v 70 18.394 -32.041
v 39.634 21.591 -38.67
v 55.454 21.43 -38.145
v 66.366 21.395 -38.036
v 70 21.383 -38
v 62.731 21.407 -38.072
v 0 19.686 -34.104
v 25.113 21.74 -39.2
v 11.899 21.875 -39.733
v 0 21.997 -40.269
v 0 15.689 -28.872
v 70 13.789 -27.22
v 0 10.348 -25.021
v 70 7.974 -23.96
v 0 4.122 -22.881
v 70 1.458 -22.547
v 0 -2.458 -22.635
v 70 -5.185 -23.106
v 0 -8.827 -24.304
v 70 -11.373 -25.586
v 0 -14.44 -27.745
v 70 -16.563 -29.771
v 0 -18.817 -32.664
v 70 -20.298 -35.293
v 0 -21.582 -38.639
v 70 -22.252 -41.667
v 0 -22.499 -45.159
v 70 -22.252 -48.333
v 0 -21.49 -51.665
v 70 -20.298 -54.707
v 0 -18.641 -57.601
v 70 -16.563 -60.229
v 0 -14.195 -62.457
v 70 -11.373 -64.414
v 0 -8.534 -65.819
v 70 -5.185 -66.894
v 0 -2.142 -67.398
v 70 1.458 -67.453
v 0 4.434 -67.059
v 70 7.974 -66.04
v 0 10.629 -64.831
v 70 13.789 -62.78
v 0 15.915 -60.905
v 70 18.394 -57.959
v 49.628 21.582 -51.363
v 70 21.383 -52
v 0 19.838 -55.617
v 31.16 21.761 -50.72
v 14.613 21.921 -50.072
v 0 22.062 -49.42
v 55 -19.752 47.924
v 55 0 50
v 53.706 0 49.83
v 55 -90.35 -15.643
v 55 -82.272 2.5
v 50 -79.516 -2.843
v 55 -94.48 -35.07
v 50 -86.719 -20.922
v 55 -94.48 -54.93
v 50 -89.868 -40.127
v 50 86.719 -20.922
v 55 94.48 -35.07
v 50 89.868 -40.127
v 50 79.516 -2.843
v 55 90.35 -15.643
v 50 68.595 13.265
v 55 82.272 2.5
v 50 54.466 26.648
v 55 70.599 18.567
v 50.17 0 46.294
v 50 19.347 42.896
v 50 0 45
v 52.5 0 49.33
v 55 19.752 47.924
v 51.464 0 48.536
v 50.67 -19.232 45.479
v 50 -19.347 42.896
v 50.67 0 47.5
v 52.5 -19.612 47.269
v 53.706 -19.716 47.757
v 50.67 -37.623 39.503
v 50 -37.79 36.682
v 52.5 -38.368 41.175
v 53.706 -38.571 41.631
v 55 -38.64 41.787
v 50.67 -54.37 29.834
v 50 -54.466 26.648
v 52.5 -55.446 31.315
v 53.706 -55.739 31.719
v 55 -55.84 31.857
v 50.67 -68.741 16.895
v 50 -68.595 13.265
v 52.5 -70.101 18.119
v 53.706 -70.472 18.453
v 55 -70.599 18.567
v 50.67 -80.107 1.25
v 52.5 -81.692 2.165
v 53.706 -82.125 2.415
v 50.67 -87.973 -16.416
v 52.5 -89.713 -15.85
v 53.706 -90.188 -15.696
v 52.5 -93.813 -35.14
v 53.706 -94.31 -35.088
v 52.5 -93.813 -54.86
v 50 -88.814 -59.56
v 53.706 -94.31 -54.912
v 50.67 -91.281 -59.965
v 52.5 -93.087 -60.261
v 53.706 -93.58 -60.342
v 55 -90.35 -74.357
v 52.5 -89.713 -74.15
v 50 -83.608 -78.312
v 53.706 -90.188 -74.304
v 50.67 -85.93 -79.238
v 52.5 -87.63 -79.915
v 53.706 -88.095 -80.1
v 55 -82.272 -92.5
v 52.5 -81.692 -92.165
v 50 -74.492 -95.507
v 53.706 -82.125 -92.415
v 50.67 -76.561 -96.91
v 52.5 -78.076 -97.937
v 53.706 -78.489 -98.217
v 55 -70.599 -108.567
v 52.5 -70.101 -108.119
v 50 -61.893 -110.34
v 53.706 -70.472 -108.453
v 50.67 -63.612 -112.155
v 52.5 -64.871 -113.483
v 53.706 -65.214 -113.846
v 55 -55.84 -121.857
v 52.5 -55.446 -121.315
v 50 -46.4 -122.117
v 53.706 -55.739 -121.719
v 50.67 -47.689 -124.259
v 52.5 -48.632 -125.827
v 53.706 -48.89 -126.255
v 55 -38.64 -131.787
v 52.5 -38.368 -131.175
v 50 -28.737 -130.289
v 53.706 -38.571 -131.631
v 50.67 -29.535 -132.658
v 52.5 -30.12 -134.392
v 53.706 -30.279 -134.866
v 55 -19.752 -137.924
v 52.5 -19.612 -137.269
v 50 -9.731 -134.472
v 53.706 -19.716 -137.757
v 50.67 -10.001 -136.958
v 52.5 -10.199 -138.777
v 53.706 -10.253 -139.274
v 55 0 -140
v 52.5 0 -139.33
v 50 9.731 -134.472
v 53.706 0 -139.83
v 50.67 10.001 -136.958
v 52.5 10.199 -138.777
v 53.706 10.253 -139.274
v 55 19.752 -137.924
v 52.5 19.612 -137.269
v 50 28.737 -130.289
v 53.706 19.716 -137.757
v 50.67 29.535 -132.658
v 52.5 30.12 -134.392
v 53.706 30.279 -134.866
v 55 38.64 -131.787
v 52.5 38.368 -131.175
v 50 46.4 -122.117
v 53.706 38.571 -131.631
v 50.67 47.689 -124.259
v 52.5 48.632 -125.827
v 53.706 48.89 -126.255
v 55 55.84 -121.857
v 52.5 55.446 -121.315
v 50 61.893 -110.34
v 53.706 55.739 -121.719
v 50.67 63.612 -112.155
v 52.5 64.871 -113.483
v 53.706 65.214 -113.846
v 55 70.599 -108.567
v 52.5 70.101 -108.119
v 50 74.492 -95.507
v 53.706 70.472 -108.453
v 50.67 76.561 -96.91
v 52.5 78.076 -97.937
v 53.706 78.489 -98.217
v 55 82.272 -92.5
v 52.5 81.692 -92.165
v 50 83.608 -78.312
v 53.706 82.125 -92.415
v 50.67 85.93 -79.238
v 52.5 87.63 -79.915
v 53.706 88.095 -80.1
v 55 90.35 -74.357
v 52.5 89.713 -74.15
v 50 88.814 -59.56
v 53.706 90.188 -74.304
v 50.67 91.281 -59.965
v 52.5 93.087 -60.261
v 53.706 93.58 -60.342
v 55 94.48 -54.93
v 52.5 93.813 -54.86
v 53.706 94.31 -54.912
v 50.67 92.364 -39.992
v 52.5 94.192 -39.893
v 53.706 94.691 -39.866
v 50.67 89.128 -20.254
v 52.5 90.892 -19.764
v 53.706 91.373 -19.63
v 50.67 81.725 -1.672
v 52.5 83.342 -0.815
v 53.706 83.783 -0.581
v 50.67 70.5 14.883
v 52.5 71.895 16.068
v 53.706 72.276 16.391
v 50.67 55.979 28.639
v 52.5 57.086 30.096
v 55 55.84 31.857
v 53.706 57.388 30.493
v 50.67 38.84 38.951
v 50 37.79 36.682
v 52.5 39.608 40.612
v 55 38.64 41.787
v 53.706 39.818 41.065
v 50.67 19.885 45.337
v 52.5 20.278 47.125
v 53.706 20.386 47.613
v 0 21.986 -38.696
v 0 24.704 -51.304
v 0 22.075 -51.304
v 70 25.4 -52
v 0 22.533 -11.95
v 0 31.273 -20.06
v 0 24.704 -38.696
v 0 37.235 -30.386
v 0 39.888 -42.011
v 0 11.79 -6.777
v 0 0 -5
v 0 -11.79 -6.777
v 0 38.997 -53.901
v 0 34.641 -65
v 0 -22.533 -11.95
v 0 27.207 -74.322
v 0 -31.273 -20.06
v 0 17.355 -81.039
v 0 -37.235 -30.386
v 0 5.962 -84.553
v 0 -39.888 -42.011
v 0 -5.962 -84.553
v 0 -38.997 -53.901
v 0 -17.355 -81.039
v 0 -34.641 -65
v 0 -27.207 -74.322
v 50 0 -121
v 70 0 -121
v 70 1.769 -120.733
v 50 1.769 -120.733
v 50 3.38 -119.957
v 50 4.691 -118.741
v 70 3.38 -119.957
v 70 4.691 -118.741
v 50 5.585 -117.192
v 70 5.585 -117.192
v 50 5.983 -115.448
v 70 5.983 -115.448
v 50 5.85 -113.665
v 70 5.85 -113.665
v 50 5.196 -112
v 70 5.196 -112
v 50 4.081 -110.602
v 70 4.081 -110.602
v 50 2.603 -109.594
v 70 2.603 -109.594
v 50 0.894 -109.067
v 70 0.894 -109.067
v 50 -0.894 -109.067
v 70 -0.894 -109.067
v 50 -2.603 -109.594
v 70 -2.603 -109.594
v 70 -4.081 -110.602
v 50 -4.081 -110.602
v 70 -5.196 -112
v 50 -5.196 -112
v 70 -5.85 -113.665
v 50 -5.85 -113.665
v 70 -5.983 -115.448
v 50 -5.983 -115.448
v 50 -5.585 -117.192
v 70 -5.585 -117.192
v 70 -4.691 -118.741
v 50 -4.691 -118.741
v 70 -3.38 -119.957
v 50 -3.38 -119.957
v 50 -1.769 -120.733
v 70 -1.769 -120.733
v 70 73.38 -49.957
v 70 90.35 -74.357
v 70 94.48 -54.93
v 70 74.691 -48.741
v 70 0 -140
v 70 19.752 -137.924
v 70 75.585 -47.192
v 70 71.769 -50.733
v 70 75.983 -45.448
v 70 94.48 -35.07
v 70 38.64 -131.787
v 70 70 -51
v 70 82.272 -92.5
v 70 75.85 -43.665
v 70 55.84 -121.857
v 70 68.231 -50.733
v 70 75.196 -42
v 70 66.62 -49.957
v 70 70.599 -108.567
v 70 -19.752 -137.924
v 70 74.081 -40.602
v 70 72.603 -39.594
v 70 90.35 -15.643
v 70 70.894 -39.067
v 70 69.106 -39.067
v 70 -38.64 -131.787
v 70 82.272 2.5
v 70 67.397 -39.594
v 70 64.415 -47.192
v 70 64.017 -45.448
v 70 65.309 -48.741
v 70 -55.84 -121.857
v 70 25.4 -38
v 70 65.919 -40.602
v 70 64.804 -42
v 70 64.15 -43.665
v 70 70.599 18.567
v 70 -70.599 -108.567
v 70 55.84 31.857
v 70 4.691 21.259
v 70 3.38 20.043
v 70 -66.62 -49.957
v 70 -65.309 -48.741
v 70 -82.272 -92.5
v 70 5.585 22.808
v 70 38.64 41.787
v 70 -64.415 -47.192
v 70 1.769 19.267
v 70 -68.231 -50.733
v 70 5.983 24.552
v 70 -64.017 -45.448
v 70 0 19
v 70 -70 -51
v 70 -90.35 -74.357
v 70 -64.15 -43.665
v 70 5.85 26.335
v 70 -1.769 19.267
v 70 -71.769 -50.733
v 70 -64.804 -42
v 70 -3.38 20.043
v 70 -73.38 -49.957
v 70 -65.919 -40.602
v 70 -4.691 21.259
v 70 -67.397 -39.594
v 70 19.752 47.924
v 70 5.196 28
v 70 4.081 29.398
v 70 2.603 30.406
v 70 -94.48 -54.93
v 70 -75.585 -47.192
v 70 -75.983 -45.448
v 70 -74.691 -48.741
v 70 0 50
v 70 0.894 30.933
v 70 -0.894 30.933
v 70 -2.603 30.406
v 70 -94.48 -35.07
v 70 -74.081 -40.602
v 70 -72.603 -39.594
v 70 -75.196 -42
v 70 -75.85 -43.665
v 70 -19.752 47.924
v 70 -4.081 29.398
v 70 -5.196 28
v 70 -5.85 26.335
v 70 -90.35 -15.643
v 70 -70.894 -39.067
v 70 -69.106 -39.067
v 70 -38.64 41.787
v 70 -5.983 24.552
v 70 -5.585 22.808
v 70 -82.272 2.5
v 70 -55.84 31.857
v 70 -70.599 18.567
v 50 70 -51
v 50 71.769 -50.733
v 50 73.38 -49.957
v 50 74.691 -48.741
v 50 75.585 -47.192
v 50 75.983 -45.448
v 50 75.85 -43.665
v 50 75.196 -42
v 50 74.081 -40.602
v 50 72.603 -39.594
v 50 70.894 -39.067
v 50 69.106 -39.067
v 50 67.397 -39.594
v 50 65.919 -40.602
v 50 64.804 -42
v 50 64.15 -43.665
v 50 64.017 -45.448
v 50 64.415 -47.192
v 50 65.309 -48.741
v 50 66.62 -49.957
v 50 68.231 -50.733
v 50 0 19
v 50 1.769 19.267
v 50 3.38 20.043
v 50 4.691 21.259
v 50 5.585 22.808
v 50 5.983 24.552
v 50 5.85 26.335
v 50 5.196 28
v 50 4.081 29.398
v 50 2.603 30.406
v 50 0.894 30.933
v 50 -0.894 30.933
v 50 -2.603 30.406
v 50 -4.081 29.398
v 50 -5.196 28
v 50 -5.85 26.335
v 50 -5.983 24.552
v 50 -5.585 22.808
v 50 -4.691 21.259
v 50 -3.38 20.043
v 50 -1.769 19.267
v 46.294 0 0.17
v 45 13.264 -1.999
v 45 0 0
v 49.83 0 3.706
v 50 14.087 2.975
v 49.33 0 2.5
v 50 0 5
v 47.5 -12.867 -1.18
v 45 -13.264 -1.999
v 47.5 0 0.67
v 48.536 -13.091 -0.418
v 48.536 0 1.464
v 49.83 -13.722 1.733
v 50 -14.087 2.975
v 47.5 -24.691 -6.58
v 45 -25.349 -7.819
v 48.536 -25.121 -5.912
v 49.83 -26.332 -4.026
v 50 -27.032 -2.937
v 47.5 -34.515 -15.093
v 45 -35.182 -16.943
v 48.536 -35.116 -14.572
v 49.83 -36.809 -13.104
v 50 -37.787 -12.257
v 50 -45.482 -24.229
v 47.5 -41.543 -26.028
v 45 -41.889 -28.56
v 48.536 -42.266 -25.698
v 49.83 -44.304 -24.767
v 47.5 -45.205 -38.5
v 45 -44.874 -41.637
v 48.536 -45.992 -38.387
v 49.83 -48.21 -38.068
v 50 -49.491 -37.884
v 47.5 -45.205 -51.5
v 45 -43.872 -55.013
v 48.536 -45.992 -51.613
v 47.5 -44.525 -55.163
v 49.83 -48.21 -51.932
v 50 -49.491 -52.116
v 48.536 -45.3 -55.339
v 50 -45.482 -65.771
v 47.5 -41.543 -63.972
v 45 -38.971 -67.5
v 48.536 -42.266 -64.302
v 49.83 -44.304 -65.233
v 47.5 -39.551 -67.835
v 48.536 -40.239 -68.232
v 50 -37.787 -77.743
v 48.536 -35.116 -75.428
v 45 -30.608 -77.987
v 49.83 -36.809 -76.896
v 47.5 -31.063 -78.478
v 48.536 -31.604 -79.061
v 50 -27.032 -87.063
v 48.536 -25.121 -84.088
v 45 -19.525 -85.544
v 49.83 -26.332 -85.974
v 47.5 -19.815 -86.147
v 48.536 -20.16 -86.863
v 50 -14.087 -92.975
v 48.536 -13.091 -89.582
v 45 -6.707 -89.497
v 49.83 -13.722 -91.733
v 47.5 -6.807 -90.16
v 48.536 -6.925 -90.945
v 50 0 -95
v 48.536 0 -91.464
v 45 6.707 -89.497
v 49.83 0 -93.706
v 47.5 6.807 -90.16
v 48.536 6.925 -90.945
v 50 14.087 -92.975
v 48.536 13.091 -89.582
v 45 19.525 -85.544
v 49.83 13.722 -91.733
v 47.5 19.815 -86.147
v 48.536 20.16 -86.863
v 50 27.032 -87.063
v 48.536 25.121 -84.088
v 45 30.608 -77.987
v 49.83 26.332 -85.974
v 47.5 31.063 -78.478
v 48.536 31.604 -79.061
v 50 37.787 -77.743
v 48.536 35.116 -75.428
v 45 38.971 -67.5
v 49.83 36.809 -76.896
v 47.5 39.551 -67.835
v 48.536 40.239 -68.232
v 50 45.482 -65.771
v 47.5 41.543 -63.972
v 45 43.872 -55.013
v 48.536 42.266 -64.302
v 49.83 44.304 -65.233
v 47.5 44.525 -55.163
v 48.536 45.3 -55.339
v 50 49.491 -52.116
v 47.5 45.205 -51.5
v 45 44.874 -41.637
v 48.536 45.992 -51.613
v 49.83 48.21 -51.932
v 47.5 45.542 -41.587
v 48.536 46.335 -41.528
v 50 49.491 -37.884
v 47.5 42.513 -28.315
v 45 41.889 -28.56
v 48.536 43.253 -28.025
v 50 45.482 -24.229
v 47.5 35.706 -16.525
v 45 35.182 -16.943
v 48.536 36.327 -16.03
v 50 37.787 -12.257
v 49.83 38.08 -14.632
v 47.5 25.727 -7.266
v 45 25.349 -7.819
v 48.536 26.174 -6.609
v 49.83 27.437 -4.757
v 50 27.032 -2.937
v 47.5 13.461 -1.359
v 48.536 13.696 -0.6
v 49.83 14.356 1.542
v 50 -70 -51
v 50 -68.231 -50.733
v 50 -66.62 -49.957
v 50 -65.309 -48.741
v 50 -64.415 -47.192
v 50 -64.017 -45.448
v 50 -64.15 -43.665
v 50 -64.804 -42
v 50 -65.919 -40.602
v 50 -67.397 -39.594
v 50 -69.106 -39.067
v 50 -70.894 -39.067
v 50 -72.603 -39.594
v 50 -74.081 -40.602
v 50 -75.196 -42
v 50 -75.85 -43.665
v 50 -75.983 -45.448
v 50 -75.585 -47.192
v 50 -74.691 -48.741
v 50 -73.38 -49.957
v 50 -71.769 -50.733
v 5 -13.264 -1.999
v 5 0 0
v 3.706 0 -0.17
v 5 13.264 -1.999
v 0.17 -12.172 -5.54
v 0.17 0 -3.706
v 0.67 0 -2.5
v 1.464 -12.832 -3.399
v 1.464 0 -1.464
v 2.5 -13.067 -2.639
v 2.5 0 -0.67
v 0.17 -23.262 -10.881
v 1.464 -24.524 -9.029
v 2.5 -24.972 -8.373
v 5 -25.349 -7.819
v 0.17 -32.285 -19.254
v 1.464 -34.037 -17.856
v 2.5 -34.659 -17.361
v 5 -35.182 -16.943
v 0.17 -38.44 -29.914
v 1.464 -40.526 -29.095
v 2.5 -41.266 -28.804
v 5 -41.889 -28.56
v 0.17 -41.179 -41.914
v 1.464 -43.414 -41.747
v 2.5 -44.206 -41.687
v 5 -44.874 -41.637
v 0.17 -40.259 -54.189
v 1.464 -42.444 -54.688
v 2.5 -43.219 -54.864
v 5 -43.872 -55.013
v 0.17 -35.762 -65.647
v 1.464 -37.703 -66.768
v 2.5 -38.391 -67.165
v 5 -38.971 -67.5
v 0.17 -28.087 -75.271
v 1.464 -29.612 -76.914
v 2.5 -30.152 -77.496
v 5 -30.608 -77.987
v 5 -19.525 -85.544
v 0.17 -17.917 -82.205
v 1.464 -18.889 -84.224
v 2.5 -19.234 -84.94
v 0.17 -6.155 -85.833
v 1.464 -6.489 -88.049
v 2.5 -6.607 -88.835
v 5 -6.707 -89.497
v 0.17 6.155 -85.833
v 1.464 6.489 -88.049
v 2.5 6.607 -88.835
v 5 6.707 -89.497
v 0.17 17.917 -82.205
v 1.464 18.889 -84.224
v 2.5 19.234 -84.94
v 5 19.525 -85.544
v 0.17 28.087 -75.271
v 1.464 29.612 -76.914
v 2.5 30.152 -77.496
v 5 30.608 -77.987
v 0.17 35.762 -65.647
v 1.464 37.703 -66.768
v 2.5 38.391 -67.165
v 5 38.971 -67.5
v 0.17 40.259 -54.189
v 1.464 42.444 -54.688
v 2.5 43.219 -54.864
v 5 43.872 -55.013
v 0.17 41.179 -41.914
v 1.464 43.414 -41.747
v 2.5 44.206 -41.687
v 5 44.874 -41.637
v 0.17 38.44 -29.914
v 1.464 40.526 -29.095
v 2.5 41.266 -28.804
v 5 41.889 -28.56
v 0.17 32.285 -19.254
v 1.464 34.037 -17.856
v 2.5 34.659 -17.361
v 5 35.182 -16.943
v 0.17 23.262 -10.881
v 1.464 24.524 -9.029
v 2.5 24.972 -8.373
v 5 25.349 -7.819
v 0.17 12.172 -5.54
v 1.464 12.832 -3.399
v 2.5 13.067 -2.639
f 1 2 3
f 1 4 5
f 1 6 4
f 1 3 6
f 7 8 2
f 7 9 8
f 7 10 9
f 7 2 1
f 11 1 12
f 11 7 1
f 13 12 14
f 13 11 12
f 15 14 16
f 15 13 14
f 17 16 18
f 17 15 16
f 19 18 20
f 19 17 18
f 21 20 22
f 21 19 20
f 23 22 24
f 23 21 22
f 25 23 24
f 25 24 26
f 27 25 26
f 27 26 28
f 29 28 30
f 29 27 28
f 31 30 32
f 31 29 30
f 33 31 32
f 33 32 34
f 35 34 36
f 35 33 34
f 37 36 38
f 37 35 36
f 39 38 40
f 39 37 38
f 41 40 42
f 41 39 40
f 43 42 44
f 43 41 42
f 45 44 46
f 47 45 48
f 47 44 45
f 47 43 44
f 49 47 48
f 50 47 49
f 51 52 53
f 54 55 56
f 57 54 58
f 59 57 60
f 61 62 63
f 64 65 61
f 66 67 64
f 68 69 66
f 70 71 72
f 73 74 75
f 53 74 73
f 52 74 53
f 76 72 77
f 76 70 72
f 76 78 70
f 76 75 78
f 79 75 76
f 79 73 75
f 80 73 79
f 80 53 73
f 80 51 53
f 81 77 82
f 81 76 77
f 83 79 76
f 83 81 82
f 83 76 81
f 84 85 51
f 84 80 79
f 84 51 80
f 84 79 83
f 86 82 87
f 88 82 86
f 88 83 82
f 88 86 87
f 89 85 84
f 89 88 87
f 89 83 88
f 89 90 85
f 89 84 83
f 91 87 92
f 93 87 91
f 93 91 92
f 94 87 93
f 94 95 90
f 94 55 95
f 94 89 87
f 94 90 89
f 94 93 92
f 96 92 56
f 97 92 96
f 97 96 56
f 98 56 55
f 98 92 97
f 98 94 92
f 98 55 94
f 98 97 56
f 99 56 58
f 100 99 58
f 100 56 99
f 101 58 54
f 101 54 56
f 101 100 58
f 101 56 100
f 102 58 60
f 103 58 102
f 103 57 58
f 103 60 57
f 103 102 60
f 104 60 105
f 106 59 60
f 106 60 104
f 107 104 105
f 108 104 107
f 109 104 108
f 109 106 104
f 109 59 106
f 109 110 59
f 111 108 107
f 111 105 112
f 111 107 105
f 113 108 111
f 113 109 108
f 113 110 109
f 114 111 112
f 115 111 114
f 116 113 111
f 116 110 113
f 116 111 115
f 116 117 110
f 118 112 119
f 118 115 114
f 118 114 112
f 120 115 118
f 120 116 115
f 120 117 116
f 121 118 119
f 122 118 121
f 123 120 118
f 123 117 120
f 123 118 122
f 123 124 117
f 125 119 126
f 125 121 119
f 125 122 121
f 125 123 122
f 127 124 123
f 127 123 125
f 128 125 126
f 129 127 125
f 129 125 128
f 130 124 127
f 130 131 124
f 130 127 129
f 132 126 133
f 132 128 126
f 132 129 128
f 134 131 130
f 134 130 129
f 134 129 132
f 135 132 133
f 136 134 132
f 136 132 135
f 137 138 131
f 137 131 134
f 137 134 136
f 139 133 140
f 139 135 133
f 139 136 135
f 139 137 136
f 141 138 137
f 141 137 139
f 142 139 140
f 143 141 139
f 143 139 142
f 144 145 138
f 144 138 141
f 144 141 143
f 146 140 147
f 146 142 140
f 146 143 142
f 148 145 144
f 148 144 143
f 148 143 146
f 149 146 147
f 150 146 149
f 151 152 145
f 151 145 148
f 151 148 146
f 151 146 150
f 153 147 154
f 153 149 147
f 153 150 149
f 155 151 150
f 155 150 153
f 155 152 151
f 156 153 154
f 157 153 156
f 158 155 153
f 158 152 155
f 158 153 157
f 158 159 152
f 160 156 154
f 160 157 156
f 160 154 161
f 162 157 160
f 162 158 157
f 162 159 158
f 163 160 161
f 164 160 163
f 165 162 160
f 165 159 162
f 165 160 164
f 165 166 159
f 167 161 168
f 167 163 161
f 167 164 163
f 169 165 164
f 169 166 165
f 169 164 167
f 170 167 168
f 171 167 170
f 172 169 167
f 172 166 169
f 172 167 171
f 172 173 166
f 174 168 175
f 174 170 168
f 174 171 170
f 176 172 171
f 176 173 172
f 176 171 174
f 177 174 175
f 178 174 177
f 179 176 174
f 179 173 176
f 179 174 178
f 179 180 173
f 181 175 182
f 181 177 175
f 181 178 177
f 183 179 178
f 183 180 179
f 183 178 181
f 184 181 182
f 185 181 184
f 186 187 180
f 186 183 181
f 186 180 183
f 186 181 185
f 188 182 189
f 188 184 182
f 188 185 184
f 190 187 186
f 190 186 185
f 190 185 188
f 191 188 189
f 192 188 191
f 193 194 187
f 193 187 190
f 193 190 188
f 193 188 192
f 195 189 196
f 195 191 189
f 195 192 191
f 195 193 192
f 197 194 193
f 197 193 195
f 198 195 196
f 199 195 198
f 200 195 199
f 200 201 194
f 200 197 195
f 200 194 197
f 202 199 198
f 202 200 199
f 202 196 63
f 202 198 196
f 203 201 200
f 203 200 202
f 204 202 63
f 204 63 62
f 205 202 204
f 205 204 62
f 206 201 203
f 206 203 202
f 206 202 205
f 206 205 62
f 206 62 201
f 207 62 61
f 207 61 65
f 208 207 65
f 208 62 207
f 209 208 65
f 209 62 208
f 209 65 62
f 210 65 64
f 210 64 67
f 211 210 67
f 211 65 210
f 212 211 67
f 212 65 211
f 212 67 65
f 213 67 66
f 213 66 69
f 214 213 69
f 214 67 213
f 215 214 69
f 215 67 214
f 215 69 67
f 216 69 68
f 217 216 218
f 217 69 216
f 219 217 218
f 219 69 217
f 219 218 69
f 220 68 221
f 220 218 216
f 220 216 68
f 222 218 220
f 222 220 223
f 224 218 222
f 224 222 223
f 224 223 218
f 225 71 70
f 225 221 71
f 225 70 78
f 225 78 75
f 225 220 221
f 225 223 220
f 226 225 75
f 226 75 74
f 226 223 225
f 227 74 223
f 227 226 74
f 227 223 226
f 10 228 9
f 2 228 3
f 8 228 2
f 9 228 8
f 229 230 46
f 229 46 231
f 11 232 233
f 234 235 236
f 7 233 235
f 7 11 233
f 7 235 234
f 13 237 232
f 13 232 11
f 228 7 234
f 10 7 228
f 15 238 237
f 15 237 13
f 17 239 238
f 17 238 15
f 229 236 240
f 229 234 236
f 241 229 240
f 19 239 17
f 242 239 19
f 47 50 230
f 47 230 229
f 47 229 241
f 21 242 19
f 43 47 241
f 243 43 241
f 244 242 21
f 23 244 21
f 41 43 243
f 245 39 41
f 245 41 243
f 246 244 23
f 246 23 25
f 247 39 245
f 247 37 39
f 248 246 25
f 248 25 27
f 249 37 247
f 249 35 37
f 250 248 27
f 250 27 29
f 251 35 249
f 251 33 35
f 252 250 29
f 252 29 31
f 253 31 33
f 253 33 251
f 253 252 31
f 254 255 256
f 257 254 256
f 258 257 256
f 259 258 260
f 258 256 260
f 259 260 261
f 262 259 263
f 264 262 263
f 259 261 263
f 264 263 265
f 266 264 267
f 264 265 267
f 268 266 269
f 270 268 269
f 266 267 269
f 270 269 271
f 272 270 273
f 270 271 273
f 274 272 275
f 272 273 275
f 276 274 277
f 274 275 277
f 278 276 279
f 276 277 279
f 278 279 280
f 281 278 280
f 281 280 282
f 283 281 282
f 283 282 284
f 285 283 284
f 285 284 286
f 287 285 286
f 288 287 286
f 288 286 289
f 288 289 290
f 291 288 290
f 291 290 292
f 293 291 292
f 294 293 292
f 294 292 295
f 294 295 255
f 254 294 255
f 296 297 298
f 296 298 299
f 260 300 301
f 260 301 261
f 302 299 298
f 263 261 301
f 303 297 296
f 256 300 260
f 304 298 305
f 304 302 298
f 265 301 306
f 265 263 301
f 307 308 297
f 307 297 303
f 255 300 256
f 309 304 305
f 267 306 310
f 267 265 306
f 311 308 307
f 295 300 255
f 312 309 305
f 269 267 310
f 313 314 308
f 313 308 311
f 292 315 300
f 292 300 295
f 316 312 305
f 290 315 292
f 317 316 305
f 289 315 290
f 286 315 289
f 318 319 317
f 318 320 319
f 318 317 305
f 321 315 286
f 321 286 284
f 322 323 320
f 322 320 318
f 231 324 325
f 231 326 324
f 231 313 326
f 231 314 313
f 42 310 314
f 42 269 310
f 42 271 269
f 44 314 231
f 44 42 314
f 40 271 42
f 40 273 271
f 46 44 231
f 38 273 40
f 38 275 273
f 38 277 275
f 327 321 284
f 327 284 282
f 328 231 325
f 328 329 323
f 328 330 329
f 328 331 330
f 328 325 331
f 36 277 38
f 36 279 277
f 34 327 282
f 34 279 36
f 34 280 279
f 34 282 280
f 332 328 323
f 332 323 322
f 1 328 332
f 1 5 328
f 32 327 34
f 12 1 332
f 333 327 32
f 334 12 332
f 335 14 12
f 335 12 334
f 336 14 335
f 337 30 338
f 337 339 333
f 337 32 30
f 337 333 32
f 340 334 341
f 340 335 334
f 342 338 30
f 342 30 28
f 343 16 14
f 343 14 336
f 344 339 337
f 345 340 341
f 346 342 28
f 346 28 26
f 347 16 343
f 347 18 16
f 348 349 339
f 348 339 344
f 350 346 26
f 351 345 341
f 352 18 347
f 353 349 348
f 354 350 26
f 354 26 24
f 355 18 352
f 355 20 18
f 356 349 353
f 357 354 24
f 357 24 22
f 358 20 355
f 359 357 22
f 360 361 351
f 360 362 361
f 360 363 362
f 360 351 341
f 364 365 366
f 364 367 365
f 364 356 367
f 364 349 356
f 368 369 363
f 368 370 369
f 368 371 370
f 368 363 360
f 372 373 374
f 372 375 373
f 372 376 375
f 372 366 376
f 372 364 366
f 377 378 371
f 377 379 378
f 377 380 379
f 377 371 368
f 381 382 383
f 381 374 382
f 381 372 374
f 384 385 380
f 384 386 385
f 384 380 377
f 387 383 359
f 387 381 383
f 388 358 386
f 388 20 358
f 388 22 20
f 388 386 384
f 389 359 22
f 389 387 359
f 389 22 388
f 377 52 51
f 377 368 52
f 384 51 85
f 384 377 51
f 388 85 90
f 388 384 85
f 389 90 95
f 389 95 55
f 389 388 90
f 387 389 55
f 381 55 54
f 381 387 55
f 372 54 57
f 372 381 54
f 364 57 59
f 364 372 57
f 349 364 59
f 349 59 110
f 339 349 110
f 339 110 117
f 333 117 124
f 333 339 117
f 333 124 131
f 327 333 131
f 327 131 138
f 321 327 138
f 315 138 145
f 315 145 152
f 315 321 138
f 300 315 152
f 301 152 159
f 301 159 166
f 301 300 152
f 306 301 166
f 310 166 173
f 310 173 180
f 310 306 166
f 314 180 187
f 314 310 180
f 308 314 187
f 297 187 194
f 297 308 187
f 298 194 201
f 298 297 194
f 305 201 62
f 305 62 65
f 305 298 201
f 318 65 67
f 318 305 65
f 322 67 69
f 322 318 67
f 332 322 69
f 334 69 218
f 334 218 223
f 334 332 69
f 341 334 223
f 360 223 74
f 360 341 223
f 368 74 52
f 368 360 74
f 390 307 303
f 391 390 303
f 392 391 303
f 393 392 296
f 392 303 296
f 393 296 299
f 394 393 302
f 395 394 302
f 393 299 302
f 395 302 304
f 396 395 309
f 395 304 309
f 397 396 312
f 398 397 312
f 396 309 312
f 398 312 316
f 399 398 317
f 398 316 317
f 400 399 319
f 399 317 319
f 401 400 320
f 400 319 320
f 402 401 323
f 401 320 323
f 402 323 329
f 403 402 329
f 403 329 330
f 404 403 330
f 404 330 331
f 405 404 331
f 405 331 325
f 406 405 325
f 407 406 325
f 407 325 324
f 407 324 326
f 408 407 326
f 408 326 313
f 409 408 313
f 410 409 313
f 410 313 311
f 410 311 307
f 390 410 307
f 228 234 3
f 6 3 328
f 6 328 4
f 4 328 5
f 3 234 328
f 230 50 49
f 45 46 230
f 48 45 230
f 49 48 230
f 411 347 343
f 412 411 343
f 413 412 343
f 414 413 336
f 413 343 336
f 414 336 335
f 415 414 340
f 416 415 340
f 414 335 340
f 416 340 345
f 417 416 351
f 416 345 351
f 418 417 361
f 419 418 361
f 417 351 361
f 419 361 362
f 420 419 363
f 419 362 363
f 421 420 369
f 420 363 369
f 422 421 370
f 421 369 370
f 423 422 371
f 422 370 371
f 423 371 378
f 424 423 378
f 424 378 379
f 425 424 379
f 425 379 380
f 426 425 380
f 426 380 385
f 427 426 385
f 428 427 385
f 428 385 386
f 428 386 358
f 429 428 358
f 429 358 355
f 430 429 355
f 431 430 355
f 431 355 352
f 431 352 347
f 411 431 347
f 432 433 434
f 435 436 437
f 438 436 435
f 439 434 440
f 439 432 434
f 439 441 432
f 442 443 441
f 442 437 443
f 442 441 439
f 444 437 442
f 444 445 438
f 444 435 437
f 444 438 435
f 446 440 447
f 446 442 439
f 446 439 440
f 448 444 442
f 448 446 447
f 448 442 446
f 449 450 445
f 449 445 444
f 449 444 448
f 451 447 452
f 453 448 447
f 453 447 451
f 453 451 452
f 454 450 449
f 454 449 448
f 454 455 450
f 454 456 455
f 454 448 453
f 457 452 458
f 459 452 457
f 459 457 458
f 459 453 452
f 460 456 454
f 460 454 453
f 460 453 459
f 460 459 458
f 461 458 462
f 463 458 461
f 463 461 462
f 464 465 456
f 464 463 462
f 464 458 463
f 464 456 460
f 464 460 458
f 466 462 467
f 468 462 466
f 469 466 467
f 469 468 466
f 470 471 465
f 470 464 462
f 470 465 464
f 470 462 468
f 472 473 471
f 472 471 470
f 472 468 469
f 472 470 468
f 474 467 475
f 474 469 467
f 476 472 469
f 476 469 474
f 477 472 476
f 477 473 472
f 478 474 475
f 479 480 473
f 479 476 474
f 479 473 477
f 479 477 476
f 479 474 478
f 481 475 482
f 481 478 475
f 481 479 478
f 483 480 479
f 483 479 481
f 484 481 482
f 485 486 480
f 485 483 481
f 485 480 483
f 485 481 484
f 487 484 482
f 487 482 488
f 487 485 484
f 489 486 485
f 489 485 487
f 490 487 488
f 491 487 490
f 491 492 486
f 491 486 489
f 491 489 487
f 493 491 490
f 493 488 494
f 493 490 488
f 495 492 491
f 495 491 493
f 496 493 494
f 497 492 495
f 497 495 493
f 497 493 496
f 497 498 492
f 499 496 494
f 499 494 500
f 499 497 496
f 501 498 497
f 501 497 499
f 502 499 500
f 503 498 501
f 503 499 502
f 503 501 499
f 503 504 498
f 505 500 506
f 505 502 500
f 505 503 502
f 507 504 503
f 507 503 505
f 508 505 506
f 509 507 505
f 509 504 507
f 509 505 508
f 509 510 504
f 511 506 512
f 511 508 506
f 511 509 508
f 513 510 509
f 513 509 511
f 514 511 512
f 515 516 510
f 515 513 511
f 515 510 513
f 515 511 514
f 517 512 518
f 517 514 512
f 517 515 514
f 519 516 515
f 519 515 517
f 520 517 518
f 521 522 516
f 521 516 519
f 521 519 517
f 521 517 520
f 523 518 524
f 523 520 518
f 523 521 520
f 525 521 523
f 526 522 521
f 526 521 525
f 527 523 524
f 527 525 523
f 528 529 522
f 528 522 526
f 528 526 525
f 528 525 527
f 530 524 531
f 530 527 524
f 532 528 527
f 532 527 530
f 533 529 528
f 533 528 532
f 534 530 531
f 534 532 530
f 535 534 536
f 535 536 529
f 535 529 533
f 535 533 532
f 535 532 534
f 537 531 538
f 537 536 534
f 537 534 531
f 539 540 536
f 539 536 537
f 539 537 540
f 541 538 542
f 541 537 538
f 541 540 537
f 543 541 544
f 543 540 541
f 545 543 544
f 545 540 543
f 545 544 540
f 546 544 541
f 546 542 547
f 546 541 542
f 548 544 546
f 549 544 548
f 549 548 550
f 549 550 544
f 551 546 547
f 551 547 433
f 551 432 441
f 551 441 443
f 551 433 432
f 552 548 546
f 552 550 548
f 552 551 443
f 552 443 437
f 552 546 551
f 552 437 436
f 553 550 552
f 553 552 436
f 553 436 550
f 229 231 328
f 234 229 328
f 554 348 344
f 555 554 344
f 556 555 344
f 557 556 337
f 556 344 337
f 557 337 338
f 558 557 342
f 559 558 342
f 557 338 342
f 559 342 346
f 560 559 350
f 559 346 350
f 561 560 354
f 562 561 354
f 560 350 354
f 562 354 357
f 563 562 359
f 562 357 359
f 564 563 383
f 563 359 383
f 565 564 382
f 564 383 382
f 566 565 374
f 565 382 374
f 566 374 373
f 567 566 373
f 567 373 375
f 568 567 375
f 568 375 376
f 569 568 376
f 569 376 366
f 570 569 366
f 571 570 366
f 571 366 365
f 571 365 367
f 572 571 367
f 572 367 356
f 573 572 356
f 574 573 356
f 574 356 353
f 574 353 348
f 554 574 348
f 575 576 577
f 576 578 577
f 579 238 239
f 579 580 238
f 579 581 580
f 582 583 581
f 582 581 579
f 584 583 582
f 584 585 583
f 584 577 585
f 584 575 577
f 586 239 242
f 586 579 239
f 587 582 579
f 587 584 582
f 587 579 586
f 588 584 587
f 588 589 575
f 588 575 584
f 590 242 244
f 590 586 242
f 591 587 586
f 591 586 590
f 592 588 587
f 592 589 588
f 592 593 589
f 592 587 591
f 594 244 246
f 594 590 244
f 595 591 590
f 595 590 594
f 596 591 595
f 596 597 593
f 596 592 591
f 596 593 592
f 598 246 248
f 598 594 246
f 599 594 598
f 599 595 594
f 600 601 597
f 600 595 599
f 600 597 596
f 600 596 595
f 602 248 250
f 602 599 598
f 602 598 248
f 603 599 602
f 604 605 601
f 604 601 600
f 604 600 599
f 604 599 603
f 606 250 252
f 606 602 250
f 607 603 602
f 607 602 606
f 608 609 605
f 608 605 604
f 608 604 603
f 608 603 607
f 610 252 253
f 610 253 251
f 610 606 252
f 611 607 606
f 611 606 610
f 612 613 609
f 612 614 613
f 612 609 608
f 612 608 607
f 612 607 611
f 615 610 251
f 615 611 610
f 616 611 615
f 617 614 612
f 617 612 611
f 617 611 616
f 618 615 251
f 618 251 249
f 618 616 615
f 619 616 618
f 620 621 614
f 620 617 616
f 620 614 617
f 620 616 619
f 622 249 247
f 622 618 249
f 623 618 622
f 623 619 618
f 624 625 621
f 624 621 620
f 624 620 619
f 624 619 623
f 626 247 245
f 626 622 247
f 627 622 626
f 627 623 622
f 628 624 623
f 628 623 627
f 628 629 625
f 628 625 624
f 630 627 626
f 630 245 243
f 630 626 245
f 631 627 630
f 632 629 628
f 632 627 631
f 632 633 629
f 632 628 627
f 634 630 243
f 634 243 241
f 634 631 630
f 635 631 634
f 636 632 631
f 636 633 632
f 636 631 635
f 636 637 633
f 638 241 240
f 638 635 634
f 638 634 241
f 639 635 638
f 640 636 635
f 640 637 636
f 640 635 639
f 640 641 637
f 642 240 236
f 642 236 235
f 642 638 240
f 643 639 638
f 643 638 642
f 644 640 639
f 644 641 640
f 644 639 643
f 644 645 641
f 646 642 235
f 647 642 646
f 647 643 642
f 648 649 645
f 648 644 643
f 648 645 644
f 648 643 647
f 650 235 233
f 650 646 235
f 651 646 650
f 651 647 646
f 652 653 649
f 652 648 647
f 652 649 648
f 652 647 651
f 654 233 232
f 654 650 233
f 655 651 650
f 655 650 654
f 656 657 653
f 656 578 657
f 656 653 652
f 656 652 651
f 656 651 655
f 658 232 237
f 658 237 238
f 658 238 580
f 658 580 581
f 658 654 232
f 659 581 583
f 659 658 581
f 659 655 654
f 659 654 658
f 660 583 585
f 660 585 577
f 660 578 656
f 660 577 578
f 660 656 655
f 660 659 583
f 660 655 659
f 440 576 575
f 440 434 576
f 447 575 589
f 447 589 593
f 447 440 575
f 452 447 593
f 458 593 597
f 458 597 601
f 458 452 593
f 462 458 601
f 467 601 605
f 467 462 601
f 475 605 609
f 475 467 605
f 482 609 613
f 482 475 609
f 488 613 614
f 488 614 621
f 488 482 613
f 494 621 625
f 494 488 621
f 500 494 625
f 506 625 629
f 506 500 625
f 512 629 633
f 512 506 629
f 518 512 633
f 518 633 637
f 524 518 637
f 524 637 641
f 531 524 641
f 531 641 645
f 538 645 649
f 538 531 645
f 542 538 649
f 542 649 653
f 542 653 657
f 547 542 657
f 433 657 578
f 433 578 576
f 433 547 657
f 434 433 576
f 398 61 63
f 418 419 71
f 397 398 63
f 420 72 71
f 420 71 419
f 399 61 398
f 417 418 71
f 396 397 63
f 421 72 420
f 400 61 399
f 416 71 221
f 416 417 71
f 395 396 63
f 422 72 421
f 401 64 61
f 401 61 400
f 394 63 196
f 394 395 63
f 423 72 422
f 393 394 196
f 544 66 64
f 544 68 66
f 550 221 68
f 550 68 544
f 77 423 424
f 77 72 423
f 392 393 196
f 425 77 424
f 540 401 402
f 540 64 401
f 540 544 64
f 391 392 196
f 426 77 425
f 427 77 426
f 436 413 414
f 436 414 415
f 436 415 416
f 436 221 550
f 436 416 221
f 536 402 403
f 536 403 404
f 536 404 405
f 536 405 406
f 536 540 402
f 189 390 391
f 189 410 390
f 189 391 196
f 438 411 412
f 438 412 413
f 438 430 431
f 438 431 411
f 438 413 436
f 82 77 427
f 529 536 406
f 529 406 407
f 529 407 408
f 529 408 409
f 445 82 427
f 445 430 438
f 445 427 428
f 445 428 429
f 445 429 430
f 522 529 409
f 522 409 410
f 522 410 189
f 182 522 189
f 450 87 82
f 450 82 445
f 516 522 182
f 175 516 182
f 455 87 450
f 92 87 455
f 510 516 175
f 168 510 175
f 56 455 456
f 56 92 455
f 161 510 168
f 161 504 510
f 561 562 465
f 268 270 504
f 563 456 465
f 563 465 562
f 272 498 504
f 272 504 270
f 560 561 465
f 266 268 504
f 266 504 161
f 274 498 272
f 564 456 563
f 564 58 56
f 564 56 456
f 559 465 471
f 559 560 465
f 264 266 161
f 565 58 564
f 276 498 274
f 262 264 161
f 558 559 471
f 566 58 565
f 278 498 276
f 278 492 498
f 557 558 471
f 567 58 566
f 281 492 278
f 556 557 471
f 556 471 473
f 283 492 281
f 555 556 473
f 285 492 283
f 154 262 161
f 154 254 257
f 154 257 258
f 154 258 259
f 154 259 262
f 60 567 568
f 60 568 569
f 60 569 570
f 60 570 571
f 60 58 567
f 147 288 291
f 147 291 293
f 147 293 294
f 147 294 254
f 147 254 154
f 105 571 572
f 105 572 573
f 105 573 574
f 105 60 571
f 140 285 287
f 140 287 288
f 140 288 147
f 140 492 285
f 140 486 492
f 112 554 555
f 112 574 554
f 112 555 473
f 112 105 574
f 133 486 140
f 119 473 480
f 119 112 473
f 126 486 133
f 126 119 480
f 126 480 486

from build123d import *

# Parameters (mm, degrees)
SKETCH10_R         = 6
CUT_EXTRUDE2_DEPTH = 184.098334236
CUT_EXTRUDE4_DEPTH = 184.098334236
CUT_EXTRUDE4_DRAFT = -0.57


with BuildPart() as part:
    # Sketch2 → Revolve1 (revolve)
    with BuildSketch(Plane(origin=(0, 0, 0), x_dir=(1, 0, 0), z_dir=(0, 1, 0))):
        with BuildLine():
            Line((0, 22.5), (0, 5))
            ThreePointArc((0, 5), (1.464466094, 1.464466094), (5, 0))
            Line((5, 0), (45, 0))
            ThreePointArc((45, 0), (48.535533906, -1.464466094), (50, -5))
            Line((50, -5), (50, -45))
            ThreePointArc((50, -45), (51.464466094, -48.535533906), (55, -50))
            Line((55, -50), (70, -50))
            Line((70, -50), (70, 22.5))
            Line((70, 22.5), (0, 22.5))
        make_face()
    revolve(axis=Axis((0, 0, -45), (1, 0, 0)))

    # Sketch10 → Cut-Extrude2 (cut, through all)
    with BuildSketch(Plane(origin=(70, 0, 0), x_dir=(0, 0, -1), z_dir=(1, 0, 0))):
        with Locations((45, -70)):
            Circle(SKETCH10_R)
        with Locations((-25, 0)):
            Circle(SKETCH10_R)
        with Locations((45, 70)):
            Circle(SKETCH10_R)
        with Locations((115, 0)):
            Circle(SKETCH10_R)
    extrude(amount=-CUT_EXTRUDE2_DEPTH, mode=Mode.SUBTRACT)


with BuildPart() as cut_extrude4_tool:
    # Sketch11 → Cut-Extrude4 (with draft: the straight prism first)
    with BuildSketch(Plane(origin=(70, 0, 0), x_dir=(0, 0, -1), z_dir=(1, 0, 0))):
        Polygon((38, 25.4), (38, 21.38340478), (38, 21.284496071), (52, 21.38340478), (52, 25.4), (45, 25.4), align=None)
    extrude(amount=-CUT_EXTRUDE4_DEPTH)
    # Cut-Extrude4: the draft: its side faces are tilted about the plane it starts from
    cut_extrude4_sides = [cut_extrude4_tool.faces().sort_by_distance(p)[0] for p in [
        (-22.049167118, 23.342248035, -38),
        (-22.049167118, 23.39170239, -52),
        (-22.049167118, 21.333950426, -45),
        (-22.049167118, 25.4, -45),
    ]]
    draft(cut_extrude4_sides, Plane(origin=(70, 0, 0), x_dir=(0, 0, -1), z_dir=(1, 0, 0)), CUT_EXTRUDE4_DRAFT)


with BuildPart() as part_1:
    add(part.part)

    # Cut-Extrude4: cut by cut_extrude4_tool
    add(cut_extrude4_tool.part, mode=Mode.SUBTRACT)


solid = part_1.part
